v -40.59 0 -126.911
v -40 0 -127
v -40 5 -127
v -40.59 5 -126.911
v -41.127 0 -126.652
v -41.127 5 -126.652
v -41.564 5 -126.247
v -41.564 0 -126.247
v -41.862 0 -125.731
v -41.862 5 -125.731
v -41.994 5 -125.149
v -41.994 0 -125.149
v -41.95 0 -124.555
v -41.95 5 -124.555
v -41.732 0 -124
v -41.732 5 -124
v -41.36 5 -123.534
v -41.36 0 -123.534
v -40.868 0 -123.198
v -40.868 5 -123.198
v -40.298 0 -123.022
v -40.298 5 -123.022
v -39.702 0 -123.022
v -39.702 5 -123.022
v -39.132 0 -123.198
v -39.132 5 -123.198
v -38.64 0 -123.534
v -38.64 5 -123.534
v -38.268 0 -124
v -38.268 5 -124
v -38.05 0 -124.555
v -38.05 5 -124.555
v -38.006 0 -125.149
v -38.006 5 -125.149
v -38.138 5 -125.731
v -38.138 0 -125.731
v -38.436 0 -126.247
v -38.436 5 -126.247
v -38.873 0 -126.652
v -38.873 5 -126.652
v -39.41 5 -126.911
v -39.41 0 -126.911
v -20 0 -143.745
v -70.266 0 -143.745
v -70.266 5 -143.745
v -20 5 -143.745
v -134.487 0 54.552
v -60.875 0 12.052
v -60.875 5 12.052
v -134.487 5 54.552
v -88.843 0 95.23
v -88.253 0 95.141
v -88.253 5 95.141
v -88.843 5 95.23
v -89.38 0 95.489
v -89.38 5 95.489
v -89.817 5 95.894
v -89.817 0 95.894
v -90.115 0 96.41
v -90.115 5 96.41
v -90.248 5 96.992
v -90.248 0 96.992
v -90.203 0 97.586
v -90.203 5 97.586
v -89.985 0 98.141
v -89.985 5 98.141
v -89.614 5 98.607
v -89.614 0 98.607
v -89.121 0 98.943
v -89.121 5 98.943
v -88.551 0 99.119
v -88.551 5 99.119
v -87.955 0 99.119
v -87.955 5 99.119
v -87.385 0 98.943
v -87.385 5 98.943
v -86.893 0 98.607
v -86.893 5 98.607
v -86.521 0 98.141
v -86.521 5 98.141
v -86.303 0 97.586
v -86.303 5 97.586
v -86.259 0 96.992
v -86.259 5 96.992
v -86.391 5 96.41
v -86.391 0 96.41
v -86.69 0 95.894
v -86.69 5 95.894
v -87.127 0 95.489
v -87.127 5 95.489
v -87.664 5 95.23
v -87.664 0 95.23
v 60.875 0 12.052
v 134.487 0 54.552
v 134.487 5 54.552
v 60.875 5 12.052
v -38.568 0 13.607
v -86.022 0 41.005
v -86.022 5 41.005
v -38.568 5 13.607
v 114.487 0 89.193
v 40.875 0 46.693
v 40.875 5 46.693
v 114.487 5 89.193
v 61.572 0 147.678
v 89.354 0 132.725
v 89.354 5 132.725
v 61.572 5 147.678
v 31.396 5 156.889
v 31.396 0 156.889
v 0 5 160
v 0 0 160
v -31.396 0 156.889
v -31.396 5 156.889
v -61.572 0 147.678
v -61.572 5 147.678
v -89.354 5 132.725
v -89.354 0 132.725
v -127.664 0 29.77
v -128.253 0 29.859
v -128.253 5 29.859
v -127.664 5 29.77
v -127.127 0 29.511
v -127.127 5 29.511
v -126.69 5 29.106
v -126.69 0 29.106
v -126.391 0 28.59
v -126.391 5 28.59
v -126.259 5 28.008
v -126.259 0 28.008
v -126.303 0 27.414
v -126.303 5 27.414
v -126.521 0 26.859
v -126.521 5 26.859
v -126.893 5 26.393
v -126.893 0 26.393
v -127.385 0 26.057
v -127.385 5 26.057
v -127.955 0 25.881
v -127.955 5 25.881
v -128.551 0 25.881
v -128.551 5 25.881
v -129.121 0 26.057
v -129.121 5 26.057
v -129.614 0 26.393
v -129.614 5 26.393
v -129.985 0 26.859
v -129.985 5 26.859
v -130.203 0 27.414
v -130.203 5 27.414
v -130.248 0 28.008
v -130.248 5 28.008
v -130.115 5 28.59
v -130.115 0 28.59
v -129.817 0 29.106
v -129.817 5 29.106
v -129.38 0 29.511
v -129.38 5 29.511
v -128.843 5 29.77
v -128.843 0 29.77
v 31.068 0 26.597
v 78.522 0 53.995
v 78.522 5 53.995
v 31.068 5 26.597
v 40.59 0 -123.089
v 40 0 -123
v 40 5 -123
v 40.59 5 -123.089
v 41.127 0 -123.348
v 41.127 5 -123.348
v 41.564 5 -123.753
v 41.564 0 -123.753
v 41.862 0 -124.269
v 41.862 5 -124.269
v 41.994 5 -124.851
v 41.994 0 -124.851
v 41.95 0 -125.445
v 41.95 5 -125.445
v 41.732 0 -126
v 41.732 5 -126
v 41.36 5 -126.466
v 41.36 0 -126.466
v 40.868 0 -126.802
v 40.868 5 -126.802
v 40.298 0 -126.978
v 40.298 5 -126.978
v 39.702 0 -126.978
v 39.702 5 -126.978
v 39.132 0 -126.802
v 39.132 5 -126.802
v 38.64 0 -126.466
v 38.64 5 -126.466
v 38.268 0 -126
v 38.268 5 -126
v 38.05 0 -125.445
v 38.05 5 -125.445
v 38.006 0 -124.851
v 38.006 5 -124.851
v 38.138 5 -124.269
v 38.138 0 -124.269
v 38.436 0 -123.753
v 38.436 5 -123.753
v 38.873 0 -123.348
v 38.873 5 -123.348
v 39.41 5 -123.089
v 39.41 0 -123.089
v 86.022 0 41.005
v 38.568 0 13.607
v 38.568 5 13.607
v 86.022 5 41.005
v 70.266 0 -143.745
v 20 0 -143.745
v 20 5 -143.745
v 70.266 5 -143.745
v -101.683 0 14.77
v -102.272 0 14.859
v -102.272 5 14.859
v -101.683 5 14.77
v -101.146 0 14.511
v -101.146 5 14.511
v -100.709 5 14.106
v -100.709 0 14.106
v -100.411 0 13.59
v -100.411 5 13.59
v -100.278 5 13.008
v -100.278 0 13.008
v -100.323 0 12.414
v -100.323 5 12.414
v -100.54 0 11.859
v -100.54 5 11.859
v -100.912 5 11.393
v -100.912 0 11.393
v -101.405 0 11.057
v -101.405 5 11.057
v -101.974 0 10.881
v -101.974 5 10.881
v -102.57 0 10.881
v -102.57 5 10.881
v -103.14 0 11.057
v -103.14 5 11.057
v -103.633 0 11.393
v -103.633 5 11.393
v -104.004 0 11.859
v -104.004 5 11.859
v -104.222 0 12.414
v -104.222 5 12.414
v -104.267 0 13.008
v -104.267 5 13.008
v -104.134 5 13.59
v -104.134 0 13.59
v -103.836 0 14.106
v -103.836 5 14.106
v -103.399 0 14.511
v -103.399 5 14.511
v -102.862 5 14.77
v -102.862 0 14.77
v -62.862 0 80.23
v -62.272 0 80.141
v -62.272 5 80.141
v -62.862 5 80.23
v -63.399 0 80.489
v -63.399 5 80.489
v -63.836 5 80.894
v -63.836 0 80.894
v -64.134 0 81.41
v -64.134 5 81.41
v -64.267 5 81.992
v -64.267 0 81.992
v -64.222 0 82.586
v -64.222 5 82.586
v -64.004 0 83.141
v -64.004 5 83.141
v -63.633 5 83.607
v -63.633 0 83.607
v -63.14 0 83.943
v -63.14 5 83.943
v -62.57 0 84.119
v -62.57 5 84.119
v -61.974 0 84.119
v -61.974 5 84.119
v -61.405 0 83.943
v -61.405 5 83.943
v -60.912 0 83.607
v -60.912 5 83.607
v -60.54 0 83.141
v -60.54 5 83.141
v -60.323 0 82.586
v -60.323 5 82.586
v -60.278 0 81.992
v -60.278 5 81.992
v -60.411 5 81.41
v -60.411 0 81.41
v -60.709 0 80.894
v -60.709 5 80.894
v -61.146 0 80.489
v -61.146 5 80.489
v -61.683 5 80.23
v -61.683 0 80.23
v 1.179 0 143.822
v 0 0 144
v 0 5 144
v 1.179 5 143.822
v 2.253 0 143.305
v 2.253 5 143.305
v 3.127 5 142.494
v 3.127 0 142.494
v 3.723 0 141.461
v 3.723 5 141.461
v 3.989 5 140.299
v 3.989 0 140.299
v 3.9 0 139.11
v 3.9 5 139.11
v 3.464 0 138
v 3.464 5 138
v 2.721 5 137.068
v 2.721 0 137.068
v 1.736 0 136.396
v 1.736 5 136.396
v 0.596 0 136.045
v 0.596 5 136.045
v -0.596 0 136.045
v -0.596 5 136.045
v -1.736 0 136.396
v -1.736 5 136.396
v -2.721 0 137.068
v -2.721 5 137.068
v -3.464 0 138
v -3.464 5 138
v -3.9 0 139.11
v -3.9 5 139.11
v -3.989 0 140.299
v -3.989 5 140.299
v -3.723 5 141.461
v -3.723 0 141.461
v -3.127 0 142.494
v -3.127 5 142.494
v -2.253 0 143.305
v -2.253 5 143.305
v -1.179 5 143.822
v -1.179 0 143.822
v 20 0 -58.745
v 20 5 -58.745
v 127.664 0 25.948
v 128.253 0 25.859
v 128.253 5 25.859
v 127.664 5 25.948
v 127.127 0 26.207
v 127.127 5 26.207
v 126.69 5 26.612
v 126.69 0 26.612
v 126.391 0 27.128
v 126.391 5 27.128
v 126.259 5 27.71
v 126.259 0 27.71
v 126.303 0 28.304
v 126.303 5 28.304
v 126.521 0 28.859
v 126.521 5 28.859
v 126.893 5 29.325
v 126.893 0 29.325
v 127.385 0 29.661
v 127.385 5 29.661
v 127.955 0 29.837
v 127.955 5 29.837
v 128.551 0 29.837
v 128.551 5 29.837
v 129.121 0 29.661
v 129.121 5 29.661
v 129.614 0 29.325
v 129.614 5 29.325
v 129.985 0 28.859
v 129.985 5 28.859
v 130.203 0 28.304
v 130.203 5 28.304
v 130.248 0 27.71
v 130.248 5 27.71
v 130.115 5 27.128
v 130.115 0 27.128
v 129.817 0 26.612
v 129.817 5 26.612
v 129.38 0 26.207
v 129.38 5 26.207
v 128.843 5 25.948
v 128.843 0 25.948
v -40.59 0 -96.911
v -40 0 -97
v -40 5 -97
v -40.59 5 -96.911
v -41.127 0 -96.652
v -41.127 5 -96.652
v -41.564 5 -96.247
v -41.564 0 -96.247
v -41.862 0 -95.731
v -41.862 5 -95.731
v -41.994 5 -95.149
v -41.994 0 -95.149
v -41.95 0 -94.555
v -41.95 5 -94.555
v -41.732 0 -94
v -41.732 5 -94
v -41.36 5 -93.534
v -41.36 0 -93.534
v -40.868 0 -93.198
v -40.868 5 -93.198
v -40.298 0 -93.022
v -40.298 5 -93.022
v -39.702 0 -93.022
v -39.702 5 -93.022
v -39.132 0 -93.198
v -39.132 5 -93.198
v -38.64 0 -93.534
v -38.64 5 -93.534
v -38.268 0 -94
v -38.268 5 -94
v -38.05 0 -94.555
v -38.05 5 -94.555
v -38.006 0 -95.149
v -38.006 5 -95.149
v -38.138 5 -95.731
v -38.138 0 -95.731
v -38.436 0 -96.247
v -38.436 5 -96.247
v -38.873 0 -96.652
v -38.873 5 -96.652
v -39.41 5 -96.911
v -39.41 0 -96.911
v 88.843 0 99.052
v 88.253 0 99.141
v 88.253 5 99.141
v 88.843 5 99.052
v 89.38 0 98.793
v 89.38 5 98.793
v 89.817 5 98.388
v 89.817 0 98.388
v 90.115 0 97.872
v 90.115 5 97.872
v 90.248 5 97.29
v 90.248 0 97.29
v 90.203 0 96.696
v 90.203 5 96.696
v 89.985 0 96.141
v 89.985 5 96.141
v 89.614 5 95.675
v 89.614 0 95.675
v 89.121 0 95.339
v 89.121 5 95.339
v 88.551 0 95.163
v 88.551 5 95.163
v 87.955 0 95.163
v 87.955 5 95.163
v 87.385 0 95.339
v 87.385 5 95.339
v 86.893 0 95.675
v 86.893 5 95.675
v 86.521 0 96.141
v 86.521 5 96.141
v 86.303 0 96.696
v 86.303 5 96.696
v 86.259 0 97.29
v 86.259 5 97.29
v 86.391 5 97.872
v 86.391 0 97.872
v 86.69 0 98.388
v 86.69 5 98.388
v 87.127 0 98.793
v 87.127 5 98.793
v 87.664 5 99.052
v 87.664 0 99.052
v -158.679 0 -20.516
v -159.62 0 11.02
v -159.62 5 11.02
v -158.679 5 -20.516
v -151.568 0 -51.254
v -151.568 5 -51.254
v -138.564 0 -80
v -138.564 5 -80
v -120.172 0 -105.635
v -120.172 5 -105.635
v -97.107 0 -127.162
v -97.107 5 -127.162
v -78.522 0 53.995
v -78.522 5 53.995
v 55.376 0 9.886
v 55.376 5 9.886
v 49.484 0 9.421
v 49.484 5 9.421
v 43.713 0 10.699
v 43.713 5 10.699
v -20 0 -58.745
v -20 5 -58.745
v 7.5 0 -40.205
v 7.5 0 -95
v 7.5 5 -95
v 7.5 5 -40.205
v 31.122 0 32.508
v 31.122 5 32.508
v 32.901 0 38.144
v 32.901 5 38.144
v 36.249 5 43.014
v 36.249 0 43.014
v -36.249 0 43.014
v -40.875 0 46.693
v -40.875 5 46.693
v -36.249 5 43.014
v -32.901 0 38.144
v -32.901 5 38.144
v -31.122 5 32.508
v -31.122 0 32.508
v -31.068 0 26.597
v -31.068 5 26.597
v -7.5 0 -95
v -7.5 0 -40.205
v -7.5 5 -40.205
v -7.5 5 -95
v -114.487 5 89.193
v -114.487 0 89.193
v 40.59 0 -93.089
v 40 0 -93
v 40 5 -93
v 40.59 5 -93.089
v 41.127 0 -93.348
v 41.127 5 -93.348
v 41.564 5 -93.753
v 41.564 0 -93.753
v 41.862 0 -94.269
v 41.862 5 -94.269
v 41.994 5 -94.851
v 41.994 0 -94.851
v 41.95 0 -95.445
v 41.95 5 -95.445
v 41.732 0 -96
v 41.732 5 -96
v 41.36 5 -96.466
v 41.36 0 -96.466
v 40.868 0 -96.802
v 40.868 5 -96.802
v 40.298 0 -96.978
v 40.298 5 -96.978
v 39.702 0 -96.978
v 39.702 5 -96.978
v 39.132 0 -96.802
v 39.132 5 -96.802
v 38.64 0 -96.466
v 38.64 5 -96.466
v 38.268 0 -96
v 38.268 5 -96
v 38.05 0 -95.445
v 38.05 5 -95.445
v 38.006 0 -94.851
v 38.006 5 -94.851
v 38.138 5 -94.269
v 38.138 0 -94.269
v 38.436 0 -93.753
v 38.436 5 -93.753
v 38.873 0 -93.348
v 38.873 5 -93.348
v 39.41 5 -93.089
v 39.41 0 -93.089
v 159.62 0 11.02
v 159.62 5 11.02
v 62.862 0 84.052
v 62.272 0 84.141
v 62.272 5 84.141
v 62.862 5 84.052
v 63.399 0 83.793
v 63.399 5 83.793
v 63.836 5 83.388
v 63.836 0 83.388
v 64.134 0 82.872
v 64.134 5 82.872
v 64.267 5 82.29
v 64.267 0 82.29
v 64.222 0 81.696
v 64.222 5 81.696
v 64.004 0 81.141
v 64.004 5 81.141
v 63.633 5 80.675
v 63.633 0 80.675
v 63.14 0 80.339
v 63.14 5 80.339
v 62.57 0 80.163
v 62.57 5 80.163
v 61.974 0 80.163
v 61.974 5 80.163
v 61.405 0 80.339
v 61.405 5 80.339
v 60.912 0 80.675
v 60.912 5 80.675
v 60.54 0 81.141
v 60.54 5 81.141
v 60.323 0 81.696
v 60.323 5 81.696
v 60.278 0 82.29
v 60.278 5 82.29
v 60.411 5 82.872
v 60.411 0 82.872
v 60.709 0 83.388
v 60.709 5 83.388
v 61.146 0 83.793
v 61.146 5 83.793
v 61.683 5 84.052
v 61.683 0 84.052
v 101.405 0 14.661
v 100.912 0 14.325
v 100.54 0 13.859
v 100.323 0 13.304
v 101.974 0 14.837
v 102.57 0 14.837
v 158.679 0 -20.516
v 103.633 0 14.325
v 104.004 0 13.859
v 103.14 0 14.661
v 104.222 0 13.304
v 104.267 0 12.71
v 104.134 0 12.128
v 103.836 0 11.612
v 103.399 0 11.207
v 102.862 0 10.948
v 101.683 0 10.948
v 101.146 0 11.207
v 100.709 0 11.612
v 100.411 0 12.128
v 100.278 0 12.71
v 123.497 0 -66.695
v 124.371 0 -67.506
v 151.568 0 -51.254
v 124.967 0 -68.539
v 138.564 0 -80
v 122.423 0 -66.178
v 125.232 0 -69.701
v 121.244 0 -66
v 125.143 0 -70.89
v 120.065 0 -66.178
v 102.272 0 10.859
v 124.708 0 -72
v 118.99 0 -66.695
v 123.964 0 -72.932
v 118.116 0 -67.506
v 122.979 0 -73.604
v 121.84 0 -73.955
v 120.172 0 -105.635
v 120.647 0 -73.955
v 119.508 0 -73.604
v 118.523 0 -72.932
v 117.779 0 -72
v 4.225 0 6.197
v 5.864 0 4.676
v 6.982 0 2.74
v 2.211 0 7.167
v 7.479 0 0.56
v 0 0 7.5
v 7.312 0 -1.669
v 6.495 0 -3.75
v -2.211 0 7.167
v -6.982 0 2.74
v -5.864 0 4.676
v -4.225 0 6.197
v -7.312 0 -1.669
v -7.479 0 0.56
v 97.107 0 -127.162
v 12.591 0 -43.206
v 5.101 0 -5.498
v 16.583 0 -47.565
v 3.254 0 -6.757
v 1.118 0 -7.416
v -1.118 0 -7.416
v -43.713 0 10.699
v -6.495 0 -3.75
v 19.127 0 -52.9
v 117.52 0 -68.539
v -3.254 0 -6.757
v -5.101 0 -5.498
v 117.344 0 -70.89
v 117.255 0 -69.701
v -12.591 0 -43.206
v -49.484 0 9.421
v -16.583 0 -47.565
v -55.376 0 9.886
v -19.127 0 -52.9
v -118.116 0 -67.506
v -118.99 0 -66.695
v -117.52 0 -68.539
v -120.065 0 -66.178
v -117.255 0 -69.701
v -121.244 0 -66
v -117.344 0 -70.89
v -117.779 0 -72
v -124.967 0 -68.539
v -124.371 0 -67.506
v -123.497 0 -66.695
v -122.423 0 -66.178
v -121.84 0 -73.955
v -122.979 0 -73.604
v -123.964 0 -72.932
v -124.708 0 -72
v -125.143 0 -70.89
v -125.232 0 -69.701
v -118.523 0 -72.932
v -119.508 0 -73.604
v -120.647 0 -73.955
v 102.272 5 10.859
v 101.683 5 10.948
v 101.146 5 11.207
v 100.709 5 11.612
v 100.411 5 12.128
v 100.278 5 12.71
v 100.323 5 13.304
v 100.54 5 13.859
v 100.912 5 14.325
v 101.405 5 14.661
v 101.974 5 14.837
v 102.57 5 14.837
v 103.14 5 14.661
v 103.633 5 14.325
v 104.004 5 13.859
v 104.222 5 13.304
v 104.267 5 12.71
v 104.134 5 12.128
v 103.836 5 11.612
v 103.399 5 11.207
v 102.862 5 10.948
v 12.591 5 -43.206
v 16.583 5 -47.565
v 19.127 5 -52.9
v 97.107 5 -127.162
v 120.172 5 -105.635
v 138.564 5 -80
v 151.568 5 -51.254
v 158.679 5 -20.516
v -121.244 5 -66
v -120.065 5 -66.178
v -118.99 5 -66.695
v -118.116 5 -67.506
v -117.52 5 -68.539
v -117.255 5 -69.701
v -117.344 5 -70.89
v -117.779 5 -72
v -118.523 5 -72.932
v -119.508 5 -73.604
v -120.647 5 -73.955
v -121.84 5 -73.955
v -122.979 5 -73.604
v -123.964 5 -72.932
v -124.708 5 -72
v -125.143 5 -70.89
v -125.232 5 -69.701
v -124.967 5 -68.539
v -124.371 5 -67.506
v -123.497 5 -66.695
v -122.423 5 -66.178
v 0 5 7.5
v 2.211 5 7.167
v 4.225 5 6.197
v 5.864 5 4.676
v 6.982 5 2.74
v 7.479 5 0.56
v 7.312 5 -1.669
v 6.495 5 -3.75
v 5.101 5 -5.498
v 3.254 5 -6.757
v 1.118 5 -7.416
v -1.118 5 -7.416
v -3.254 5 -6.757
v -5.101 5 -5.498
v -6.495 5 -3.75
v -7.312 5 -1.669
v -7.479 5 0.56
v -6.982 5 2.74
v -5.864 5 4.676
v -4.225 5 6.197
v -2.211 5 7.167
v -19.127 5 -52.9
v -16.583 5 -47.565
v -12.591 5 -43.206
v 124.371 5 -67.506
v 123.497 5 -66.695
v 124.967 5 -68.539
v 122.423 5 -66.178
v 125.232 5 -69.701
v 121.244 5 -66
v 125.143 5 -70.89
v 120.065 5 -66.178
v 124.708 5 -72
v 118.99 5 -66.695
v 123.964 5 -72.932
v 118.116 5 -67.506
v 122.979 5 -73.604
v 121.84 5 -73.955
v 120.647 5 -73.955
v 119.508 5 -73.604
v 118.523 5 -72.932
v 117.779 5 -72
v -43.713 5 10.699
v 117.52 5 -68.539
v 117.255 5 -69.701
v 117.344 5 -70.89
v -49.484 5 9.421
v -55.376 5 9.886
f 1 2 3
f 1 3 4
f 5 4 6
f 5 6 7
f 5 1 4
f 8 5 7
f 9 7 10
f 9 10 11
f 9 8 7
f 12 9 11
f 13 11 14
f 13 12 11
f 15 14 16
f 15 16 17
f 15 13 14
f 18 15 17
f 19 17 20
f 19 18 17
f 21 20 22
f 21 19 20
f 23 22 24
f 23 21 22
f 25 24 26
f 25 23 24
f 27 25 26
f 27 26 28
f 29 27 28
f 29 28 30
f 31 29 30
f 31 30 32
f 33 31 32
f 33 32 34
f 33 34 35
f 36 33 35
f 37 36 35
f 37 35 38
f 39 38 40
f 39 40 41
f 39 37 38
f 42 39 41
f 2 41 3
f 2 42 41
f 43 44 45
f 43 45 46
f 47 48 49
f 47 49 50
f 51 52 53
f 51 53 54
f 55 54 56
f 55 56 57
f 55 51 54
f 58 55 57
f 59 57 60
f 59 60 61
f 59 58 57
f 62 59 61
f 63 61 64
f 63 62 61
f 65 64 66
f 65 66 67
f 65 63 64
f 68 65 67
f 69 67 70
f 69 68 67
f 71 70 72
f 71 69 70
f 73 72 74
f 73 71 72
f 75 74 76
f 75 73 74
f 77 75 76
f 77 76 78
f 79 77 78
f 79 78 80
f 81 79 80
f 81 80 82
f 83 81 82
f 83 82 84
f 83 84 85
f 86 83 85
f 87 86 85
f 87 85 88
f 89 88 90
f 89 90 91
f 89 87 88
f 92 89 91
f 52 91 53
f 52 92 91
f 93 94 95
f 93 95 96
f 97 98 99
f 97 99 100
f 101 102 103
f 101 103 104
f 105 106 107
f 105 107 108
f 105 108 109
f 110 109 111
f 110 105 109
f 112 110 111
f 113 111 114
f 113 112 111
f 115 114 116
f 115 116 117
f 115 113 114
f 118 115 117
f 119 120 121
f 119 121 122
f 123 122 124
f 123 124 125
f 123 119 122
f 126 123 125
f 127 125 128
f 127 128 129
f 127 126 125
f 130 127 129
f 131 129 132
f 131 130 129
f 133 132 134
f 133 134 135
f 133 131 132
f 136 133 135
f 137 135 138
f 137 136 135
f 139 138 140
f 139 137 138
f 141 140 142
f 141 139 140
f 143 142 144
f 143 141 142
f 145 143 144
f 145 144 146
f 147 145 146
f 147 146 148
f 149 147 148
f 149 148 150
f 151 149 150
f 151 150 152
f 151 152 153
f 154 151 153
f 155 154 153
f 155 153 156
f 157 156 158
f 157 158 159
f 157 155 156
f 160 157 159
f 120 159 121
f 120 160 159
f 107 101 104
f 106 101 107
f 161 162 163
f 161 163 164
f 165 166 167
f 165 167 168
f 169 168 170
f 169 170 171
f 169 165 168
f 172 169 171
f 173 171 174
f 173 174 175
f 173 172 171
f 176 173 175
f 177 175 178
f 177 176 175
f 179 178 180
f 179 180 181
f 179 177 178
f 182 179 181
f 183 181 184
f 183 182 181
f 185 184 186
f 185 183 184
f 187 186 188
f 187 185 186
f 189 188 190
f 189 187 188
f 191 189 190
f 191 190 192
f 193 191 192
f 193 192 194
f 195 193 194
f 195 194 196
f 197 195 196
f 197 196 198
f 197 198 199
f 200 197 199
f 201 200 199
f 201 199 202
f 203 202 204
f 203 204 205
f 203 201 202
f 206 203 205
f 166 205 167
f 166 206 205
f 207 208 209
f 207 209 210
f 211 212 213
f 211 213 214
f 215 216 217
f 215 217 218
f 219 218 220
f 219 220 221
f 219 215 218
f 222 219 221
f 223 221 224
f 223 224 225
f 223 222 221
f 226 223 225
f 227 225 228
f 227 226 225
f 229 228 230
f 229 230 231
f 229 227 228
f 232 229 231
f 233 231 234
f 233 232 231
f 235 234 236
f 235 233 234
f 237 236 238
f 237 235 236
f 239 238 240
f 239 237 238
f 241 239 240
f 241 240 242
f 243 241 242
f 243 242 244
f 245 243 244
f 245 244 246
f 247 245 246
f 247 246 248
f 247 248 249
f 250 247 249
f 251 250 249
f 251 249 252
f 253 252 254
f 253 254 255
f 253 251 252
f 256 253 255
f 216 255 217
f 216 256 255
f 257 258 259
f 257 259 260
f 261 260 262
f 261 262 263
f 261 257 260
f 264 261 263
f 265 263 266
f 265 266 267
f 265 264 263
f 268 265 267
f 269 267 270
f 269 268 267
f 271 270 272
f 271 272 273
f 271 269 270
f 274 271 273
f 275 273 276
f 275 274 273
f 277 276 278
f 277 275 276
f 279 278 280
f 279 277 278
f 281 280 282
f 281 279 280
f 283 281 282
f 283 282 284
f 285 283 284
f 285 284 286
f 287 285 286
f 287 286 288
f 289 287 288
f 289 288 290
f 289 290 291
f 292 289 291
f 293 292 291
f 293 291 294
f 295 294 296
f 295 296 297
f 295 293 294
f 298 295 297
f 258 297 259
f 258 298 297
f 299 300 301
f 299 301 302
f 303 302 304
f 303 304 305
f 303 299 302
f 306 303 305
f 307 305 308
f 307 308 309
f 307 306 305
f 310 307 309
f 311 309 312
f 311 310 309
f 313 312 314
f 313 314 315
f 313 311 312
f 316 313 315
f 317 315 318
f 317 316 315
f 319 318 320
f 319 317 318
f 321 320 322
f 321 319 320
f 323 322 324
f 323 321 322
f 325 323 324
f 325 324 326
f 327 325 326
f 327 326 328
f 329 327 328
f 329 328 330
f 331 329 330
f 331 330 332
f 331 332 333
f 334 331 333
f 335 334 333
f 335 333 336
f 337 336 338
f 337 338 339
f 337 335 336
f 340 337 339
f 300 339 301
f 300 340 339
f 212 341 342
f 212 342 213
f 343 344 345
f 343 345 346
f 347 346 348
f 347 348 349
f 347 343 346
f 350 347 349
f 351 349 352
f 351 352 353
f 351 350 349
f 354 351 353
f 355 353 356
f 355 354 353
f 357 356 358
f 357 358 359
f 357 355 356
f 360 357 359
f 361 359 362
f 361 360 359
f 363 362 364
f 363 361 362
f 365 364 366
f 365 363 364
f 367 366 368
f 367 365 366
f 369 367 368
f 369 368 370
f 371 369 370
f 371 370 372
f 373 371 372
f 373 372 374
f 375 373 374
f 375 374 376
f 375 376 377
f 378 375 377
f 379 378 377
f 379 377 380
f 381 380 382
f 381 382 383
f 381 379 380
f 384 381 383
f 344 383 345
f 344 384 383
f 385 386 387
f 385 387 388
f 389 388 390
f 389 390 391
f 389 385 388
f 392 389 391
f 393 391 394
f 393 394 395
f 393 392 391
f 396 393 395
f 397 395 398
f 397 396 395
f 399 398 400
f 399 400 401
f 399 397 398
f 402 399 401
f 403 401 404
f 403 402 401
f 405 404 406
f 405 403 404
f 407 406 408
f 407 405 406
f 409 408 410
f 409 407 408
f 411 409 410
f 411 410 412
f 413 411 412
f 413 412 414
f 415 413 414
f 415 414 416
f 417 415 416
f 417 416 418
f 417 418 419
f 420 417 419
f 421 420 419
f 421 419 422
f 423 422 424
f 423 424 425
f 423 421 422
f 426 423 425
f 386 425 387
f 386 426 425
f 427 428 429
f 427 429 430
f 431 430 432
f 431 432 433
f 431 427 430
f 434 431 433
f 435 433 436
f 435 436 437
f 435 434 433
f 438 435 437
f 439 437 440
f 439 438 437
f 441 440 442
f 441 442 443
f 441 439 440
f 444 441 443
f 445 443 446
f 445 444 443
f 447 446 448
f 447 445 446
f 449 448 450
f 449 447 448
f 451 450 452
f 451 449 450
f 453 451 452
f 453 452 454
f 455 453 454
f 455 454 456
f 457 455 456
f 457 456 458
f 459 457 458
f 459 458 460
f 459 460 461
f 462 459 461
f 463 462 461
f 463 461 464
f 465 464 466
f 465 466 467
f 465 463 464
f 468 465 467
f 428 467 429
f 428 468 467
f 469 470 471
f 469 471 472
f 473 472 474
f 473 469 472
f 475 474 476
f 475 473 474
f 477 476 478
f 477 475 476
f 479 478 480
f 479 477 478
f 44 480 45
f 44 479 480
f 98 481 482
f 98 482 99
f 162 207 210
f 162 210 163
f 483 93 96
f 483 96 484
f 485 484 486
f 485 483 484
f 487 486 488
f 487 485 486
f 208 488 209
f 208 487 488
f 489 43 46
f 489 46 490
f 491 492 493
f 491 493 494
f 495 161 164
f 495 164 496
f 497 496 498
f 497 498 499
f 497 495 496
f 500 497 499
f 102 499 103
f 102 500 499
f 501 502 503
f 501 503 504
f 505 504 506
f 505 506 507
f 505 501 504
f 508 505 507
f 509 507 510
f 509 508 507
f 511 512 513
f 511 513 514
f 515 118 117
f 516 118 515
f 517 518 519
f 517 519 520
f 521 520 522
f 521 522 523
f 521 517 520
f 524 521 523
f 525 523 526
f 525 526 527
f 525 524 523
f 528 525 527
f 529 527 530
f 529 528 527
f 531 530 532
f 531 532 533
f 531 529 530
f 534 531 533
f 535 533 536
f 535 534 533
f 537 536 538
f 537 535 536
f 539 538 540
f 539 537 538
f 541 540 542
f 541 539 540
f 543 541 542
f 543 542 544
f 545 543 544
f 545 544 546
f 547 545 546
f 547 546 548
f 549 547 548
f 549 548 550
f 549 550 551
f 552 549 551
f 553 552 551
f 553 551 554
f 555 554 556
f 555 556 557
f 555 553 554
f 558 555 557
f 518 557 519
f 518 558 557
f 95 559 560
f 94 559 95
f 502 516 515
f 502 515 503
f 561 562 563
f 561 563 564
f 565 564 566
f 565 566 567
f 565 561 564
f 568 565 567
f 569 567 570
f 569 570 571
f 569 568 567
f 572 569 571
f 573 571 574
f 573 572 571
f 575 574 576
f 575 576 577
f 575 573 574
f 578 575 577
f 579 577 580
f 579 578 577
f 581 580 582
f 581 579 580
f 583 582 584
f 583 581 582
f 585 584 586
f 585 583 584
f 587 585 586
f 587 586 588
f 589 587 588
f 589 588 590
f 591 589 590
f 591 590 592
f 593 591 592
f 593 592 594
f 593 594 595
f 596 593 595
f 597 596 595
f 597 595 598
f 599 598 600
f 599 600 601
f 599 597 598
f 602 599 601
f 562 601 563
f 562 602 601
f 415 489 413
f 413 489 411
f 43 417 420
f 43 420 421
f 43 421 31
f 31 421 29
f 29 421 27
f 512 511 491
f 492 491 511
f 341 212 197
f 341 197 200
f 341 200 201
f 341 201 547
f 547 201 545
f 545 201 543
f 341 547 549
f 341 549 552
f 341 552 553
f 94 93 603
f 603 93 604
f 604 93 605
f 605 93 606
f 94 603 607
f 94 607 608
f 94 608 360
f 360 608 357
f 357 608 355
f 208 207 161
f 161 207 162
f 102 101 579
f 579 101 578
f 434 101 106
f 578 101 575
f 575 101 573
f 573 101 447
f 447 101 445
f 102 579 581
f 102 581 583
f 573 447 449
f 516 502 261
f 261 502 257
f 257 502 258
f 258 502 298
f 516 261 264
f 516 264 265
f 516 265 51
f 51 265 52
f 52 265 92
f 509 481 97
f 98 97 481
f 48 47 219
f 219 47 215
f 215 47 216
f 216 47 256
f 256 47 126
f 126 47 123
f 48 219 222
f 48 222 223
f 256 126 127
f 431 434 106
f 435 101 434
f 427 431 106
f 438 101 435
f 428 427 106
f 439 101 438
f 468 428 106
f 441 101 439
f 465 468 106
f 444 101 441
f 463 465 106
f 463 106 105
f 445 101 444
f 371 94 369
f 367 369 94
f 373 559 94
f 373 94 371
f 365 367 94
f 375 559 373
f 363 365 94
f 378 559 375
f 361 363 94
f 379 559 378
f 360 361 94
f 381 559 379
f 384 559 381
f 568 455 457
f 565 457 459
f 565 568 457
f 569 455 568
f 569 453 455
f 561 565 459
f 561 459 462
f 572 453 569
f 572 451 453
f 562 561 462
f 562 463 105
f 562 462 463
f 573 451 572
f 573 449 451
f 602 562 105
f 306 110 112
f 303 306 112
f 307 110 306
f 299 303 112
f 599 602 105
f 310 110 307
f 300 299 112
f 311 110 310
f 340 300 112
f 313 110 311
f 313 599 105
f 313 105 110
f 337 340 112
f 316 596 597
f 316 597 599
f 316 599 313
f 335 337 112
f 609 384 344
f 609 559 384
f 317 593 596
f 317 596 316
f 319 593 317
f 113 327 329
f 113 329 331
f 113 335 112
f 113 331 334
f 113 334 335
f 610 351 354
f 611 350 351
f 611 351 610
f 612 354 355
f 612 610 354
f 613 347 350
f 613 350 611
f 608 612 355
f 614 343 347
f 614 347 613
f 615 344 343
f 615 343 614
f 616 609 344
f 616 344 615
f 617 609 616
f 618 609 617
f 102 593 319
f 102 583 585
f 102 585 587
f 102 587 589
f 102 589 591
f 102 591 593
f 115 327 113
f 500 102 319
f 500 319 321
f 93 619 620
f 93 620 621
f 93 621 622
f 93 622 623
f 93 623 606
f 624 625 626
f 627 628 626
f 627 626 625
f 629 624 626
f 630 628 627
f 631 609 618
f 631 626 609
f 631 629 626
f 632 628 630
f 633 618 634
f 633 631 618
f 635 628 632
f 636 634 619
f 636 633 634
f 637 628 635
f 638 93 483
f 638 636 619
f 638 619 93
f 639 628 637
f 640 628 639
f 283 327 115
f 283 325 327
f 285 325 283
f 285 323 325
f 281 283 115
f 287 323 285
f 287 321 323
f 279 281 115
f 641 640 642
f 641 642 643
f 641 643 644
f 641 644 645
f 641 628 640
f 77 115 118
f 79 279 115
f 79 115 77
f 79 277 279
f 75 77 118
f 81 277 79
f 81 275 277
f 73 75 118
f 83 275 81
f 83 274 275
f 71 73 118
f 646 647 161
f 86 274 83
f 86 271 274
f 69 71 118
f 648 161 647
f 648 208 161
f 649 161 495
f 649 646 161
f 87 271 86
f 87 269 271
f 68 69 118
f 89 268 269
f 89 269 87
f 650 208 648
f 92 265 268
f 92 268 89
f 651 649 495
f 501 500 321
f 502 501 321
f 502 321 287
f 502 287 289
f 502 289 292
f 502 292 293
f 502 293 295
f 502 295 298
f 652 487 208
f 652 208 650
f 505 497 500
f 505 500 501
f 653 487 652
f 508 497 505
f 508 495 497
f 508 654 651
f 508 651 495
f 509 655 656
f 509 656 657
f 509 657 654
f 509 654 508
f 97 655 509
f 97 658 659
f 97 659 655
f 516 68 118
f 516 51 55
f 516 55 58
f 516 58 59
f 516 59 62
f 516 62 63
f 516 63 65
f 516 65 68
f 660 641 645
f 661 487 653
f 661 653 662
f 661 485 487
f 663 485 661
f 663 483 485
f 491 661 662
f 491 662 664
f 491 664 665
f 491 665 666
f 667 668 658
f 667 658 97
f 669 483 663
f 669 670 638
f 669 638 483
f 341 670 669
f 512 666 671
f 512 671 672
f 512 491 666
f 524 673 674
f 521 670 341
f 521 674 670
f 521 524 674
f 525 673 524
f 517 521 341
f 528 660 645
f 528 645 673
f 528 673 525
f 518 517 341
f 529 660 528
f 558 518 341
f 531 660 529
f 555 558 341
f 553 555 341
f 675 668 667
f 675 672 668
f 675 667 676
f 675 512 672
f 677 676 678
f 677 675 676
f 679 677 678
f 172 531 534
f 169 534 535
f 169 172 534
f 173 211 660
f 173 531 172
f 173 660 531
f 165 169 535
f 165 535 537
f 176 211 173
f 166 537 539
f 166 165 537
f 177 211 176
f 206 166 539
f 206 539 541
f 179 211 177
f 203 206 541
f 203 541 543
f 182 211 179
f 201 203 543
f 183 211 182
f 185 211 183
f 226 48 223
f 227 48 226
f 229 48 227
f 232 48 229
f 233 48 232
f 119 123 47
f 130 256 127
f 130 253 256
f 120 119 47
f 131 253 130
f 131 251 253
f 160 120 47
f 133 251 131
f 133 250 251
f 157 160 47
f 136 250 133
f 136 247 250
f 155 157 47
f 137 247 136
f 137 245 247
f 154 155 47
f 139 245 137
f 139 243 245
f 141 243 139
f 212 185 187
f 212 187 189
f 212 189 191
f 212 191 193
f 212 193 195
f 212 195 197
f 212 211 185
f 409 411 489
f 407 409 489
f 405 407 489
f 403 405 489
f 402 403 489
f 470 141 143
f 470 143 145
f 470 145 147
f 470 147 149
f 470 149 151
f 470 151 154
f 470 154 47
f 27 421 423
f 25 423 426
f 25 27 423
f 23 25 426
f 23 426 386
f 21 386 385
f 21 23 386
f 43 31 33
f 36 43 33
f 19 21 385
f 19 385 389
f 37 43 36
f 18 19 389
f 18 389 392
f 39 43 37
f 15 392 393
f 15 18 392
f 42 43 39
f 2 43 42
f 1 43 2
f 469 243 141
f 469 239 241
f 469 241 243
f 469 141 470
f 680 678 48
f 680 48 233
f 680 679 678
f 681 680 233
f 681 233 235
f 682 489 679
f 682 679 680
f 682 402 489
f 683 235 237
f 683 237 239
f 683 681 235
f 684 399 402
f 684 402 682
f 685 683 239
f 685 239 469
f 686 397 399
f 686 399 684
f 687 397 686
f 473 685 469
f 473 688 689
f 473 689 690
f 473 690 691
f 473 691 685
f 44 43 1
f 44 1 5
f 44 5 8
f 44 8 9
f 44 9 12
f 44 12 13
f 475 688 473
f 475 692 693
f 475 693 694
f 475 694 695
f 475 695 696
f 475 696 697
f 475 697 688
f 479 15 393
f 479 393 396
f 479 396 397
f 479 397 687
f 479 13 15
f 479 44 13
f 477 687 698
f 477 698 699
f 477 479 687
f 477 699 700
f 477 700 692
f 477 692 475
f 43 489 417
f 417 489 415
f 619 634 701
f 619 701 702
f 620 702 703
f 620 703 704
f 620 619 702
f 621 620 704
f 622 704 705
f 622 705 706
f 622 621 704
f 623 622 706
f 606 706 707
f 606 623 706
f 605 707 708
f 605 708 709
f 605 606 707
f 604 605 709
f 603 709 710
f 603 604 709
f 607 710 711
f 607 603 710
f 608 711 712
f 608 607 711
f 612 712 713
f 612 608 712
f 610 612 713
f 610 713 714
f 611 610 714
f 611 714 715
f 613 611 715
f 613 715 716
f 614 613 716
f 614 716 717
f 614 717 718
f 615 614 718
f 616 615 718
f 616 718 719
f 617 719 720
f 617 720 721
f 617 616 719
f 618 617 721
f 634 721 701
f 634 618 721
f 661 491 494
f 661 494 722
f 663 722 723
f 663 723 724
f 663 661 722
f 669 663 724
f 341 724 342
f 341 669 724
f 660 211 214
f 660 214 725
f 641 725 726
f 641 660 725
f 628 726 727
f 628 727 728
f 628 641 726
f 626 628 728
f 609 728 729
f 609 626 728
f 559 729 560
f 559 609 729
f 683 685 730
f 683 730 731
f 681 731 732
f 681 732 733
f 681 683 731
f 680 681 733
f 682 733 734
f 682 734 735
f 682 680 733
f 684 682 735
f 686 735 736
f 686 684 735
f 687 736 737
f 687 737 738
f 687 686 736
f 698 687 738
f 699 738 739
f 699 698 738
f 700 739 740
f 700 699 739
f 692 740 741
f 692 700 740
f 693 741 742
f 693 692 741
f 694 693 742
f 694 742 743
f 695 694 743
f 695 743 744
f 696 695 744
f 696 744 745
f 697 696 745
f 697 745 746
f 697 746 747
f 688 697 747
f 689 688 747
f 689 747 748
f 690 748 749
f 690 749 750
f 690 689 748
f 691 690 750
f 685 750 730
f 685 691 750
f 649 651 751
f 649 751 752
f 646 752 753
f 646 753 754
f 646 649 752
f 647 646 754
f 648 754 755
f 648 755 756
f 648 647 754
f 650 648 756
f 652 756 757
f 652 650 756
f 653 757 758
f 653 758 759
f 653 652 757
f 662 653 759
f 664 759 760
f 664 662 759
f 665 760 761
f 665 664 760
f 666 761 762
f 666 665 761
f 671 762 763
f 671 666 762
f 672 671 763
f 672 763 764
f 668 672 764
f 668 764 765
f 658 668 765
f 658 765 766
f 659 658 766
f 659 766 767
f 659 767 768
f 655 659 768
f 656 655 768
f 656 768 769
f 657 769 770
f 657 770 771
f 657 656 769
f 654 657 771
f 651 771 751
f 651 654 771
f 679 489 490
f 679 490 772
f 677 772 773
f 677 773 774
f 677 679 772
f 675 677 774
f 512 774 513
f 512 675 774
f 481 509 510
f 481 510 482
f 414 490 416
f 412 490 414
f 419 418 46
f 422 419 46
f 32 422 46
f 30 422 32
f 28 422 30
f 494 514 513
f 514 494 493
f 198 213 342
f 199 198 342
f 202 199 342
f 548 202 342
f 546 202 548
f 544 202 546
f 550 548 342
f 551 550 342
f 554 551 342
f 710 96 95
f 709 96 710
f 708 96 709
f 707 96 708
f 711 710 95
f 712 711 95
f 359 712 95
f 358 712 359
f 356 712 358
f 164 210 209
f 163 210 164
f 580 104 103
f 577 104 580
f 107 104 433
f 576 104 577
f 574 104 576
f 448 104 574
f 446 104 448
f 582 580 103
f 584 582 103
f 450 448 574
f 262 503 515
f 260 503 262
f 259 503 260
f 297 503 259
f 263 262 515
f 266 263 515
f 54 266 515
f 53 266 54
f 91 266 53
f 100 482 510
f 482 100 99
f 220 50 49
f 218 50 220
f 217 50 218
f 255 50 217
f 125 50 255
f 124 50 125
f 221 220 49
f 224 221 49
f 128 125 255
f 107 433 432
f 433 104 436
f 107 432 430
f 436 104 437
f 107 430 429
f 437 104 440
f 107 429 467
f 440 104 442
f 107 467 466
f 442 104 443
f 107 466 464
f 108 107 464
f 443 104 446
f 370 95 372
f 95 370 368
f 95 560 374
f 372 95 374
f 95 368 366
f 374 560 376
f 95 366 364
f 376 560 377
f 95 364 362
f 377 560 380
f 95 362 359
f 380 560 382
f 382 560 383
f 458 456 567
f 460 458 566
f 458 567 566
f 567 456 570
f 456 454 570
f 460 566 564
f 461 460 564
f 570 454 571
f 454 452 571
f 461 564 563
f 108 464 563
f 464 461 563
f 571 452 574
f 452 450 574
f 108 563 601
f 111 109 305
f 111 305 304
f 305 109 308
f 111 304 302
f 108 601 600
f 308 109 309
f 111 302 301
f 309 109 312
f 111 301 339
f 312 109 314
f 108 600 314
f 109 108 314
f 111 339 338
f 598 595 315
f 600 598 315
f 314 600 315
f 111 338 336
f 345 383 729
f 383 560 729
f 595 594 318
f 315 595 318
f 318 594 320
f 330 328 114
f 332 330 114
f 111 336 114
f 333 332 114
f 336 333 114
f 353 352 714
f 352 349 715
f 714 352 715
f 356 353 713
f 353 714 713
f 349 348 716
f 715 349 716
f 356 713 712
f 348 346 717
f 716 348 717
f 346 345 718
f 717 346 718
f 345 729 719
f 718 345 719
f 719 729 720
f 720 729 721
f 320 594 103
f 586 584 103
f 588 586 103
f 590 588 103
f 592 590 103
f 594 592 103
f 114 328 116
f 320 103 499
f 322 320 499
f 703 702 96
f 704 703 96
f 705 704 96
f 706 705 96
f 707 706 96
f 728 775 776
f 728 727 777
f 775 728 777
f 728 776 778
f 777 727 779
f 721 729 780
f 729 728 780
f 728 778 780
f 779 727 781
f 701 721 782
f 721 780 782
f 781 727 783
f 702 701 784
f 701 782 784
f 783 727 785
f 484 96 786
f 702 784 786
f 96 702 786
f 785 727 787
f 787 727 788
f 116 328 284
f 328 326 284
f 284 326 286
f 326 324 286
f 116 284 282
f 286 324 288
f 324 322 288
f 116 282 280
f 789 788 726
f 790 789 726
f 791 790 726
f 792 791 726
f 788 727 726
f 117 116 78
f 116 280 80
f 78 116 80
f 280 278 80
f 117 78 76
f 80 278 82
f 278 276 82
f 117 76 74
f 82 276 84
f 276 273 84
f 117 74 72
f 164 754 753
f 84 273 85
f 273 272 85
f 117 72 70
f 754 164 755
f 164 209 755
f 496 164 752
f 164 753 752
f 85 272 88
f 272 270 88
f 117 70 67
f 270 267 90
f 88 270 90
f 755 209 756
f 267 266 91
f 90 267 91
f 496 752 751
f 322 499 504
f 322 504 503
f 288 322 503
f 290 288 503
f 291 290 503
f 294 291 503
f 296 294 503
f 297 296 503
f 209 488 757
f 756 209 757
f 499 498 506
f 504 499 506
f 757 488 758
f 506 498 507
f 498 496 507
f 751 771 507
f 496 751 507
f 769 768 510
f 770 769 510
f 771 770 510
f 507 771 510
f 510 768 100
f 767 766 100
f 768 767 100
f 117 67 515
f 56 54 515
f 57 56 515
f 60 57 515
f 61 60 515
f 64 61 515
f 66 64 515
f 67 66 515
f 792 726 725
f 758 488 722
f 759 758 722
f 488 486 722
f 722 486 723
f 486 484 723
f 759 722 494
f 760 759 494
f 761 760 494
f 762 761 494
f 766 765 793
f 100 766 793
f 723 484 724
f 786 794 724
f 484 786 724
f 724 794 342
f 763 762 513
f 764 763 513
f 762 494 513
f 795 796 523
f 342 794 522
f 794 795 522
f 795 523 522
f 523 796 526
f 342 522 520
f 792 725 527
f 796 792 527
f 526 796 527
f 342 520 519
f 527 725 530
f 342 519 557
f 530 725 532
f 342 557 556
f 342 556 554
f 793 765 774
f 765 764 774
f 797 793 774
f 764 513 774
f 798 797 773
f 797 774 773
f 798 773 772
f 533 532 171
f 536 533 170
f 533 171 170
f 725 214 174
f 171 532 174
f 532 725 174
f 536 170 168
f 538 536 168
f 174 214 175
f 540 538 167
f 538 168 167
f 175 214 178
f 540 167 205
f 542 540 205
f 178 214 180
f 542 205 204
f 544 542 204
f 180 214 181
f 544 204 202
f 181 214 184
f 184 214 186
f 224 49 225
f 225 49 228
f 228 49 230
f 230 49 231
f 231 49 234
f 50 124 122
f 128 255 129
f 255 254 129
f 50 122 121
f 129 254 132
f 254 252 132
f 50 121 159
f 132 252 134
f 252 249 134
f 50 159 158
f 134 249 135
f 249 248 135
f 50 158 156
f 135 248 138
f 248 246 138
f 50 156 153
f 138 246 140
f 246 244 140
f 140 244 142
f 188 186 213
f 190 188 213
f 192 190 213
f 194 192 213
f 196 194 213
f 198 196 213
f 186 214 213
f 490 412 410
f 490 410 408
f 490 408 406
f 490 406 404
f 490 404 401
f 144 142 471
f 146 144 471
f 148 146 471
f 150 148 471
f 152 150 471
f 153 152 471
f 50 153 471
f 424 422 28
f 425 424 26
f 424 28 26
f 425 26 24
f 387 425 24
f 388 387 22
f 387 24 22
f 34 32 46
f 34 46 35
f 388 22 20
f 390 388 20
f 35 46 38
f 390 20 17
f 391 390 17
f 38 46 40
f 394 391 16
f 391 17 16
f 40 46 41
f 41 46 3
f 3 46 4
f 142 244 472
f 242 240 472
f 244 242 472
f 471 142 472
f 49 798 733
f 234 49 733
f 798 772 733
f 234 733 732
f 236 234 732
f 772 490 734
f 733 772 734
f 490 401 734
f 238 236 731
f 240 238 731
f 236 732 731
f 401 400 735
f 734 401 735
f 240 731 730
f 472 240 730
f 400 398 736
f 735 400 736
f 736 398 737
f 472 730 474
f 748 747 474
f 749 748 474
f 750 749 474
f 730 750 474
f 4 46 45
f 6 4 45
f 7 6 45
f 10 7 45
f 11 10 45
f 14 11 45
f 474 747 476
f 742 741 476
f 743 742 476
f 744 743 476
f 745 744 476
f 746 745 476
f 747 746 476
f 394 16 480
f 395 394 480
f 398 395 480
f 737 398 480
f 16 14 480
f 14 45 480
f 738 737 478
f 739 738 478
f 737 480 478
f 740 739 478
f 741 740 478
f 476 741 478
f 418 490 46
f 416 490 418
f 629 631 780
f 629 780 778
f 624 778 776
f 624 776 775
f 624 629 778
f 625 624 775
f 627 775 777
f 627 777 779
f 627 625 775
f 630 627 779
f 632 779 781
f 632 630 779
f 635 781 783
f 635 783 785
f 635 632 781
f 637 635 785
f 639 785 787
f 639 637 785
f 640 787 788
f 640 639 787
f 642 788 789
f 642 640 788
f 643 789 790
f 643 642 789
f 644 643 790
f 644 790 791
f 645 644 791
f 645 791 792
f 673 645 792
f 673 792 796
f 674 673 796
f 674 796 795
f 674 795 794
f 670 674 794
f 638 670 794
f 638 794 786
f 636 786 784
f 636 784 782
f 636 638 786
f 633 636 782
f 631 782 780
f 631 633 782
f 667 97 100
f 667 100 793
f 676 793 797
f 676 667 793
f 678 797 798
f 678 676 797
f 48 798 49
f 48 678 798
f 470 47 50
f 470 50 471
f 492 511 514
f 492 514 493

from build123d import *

# Parameters (mm, degrees)
SKETCH1_R           = 2
SKETCH1_R_2         = 4
SKETCH1_R_3         = 7.5
BOSS_EXTRUDE1_DEPTH = 5


with BuildPart() as part:
    # Sketch1 → Boss-Extrude1 (new body)
    with BuildSketch(Plane(origin=(0, 0, 0), x_dir=(1, 0, 0), z_dir=(0, 1, 0))):
        with BuildLine():
            Line((-20, 143.745078664), (-20, 58.745078664))
            ThreePointArc((-20, 58.745078664), (-16.583123952, 47.564738776), (-7.5, 40.204582446))
            Line((-7.5, 40.204582446), (-7.5, 95))
            Line((-7.5, 95), (7.5, 95))
            Line((7.5, 95), (7.5, 40.204582446))
            ThreePointArc((7.5, 40.204582446), (16.583123952, 47.564738776), (20, 58.745078664))
            Line((20, 58.745078664), (20, 143.745078664))
            Line((20, 143.745078664), (70.266296045, 143.745078664))
            ThreePointArc((70.266296045, 143.745078664), (138.564064606, 80), (159.620037815, -11.020141927))
            Line((159.620037815, -11.020141927), (134.486889792, -54.552031256))
            Line((134.486889792, -54.552031256), (60.87473047, -12.052031256))
            ThreePointArc((60.87473047, -12.052031256), (49.483834081, -9.420962772), (38.568189747, -13.607100695))
            Line((38.568189747, -13.607100695), (86.02241336, -41.004809472))
            Line((86.02241336, -41.004809472), (78.52241336, -53.995190528))
            Line((78.52241336, -53.995190528), (31.068189747, -26.597481751))
            ThreePointArc((31.068189747, -26.597481751), (32.900710129, -38.143776005), (40.87473047, -46.693047408))
            Line((40.87473047, -46.693047408), (114.486889792, -89.193047408))
            Line((114.486889792, -89.193047408), (89.353741769, -132.724936737))
            ThreePointArc((89.353741769, -132.724936737), (0, -160), (-89.353741769, -132.724936737))
            Line((-89.353741769, -132.724936737), (-114.486889792, -89.193047408))
            Line((-114.486889792, -89.193047408), (-40.87473047, -46.693047408))
            ThreePointArc((-40.87473047, -46.693047408), (-32.900710129, -38.143776005), (-31.068189747, -26.597481751))
            Line((-31.068189747, -26.597481751), (-78.52241336, -53.995190528))
            Line((-78.52241336, -53.995190528), (-86.02241336, -41.004809472))
            Line((-86.02241336, -41.004809472), (-38.568189747, -13.607100695))
            ThreePointArc((-38.568189747, -13.607100695), (-49.483834081, -9.420962772), (-60.87473047, -12.052031256))
            Line((-60.87473047, -12.052031256), (-134.486889792, -54.552031256))
            Line((-134.486889792, -54.552031256), (-159.620037815, -11.020141927))
            ThreePointArc((-159.620037815, -11.020141927), (-138.564064606, 80), (-70.266296045, 143.745078664))
            Line((-70.266296045, 143.745078664), (-20, 143.745078664))
        make_face()
        with Locations(Location((40, 125, 0), (0, 0, 270))):
            Circle(SKETCH1_R, mode=Mode.SUBTRACT)
        with Locations(Location((40, 95, 0), (0, 0, 270))):
            Circle(SKETCH1_R, mode=Mode.SUBTRACT)
        with Locations(Location((-40, 95, 0), (0, 0, 90))):
            Circle(SKETCH1_R, mode=Mode.SUBTRACT)
        with Locations(Location((-40, 125, 0), (0, 0, 90))):
            Circle(SKETCH1_R, mode=Mode.SUBTRACT)
        with Locations(Location((102.27241336, -12.858983849, 0), (0, 0, 90))):
            Circle(SKETCH1_R, mode=Mode.SUBTRACT)
        with Locations(Location((128.253175473, -27.858983849, 0), (0, 0, 90))):
            Circle(SKETCH1_R, mode=Mode.SUBTRACT)
        with Locations(Location((88.253175473, -97.141016151, 0), (0, 0, 270))):
            Circle(SKETCH1_R, mode=Mode.SUBTRACT)
        with Locations(Location((62.27241336, -82.141016151, 0), (0, 0, 270))):
            Circle(SKETCH1_R, mode=Mode.SUBTRACT)
        with Locations(Location((-62.272413359, -82.141016151, 0), (0, 0, 90))):
            Circle(SKETCH1_R, mode=Mode.SUBTRACT)
        with Locations(Location((-88.253175473, -97.141016151, 0), (0, 0, 90))):
            Circle(SKETCH1_R, mode=Mode.SUBTRACT)
        with Locations(Location((-128.253175473, -27.858983849, 0), (0, 0, 270))):
            Circle(SKETCH1_R, mode=Mode.SUBTRACT)
        with Locations(Location((-102.272413359, -12.858983849, 0), (0, 0, 270))):
            Circle(SKETCH1_R, mode=Mode.SUBTRACT)
        with Locations(Location((0, -140, 0), (0, 0, 270))):
            Circle(SKETCH1_R_2, mode=Mode.SUBTRACT)
        with Locations(Location((-121.24355653, 70, 0), (0, 0, 270))):
            Circle(SKETCH1_R_2, mode=Mode.SUBTRACT)
        with Locations(Location((121.24355653, 70, 0), (0, 0, 270))):
            Circle(SKETCH1_R_2, mode=Mode.SUBTRACT)
        with Locations(Location((0, 0, 0), (0, 0, 270))):
            Circle(SKETCH1_R_3, mode=Mode.SUBTRACT)
    extrude(amount=BOSS_EXTRUDE1_DEPTH)


solid = part.part
